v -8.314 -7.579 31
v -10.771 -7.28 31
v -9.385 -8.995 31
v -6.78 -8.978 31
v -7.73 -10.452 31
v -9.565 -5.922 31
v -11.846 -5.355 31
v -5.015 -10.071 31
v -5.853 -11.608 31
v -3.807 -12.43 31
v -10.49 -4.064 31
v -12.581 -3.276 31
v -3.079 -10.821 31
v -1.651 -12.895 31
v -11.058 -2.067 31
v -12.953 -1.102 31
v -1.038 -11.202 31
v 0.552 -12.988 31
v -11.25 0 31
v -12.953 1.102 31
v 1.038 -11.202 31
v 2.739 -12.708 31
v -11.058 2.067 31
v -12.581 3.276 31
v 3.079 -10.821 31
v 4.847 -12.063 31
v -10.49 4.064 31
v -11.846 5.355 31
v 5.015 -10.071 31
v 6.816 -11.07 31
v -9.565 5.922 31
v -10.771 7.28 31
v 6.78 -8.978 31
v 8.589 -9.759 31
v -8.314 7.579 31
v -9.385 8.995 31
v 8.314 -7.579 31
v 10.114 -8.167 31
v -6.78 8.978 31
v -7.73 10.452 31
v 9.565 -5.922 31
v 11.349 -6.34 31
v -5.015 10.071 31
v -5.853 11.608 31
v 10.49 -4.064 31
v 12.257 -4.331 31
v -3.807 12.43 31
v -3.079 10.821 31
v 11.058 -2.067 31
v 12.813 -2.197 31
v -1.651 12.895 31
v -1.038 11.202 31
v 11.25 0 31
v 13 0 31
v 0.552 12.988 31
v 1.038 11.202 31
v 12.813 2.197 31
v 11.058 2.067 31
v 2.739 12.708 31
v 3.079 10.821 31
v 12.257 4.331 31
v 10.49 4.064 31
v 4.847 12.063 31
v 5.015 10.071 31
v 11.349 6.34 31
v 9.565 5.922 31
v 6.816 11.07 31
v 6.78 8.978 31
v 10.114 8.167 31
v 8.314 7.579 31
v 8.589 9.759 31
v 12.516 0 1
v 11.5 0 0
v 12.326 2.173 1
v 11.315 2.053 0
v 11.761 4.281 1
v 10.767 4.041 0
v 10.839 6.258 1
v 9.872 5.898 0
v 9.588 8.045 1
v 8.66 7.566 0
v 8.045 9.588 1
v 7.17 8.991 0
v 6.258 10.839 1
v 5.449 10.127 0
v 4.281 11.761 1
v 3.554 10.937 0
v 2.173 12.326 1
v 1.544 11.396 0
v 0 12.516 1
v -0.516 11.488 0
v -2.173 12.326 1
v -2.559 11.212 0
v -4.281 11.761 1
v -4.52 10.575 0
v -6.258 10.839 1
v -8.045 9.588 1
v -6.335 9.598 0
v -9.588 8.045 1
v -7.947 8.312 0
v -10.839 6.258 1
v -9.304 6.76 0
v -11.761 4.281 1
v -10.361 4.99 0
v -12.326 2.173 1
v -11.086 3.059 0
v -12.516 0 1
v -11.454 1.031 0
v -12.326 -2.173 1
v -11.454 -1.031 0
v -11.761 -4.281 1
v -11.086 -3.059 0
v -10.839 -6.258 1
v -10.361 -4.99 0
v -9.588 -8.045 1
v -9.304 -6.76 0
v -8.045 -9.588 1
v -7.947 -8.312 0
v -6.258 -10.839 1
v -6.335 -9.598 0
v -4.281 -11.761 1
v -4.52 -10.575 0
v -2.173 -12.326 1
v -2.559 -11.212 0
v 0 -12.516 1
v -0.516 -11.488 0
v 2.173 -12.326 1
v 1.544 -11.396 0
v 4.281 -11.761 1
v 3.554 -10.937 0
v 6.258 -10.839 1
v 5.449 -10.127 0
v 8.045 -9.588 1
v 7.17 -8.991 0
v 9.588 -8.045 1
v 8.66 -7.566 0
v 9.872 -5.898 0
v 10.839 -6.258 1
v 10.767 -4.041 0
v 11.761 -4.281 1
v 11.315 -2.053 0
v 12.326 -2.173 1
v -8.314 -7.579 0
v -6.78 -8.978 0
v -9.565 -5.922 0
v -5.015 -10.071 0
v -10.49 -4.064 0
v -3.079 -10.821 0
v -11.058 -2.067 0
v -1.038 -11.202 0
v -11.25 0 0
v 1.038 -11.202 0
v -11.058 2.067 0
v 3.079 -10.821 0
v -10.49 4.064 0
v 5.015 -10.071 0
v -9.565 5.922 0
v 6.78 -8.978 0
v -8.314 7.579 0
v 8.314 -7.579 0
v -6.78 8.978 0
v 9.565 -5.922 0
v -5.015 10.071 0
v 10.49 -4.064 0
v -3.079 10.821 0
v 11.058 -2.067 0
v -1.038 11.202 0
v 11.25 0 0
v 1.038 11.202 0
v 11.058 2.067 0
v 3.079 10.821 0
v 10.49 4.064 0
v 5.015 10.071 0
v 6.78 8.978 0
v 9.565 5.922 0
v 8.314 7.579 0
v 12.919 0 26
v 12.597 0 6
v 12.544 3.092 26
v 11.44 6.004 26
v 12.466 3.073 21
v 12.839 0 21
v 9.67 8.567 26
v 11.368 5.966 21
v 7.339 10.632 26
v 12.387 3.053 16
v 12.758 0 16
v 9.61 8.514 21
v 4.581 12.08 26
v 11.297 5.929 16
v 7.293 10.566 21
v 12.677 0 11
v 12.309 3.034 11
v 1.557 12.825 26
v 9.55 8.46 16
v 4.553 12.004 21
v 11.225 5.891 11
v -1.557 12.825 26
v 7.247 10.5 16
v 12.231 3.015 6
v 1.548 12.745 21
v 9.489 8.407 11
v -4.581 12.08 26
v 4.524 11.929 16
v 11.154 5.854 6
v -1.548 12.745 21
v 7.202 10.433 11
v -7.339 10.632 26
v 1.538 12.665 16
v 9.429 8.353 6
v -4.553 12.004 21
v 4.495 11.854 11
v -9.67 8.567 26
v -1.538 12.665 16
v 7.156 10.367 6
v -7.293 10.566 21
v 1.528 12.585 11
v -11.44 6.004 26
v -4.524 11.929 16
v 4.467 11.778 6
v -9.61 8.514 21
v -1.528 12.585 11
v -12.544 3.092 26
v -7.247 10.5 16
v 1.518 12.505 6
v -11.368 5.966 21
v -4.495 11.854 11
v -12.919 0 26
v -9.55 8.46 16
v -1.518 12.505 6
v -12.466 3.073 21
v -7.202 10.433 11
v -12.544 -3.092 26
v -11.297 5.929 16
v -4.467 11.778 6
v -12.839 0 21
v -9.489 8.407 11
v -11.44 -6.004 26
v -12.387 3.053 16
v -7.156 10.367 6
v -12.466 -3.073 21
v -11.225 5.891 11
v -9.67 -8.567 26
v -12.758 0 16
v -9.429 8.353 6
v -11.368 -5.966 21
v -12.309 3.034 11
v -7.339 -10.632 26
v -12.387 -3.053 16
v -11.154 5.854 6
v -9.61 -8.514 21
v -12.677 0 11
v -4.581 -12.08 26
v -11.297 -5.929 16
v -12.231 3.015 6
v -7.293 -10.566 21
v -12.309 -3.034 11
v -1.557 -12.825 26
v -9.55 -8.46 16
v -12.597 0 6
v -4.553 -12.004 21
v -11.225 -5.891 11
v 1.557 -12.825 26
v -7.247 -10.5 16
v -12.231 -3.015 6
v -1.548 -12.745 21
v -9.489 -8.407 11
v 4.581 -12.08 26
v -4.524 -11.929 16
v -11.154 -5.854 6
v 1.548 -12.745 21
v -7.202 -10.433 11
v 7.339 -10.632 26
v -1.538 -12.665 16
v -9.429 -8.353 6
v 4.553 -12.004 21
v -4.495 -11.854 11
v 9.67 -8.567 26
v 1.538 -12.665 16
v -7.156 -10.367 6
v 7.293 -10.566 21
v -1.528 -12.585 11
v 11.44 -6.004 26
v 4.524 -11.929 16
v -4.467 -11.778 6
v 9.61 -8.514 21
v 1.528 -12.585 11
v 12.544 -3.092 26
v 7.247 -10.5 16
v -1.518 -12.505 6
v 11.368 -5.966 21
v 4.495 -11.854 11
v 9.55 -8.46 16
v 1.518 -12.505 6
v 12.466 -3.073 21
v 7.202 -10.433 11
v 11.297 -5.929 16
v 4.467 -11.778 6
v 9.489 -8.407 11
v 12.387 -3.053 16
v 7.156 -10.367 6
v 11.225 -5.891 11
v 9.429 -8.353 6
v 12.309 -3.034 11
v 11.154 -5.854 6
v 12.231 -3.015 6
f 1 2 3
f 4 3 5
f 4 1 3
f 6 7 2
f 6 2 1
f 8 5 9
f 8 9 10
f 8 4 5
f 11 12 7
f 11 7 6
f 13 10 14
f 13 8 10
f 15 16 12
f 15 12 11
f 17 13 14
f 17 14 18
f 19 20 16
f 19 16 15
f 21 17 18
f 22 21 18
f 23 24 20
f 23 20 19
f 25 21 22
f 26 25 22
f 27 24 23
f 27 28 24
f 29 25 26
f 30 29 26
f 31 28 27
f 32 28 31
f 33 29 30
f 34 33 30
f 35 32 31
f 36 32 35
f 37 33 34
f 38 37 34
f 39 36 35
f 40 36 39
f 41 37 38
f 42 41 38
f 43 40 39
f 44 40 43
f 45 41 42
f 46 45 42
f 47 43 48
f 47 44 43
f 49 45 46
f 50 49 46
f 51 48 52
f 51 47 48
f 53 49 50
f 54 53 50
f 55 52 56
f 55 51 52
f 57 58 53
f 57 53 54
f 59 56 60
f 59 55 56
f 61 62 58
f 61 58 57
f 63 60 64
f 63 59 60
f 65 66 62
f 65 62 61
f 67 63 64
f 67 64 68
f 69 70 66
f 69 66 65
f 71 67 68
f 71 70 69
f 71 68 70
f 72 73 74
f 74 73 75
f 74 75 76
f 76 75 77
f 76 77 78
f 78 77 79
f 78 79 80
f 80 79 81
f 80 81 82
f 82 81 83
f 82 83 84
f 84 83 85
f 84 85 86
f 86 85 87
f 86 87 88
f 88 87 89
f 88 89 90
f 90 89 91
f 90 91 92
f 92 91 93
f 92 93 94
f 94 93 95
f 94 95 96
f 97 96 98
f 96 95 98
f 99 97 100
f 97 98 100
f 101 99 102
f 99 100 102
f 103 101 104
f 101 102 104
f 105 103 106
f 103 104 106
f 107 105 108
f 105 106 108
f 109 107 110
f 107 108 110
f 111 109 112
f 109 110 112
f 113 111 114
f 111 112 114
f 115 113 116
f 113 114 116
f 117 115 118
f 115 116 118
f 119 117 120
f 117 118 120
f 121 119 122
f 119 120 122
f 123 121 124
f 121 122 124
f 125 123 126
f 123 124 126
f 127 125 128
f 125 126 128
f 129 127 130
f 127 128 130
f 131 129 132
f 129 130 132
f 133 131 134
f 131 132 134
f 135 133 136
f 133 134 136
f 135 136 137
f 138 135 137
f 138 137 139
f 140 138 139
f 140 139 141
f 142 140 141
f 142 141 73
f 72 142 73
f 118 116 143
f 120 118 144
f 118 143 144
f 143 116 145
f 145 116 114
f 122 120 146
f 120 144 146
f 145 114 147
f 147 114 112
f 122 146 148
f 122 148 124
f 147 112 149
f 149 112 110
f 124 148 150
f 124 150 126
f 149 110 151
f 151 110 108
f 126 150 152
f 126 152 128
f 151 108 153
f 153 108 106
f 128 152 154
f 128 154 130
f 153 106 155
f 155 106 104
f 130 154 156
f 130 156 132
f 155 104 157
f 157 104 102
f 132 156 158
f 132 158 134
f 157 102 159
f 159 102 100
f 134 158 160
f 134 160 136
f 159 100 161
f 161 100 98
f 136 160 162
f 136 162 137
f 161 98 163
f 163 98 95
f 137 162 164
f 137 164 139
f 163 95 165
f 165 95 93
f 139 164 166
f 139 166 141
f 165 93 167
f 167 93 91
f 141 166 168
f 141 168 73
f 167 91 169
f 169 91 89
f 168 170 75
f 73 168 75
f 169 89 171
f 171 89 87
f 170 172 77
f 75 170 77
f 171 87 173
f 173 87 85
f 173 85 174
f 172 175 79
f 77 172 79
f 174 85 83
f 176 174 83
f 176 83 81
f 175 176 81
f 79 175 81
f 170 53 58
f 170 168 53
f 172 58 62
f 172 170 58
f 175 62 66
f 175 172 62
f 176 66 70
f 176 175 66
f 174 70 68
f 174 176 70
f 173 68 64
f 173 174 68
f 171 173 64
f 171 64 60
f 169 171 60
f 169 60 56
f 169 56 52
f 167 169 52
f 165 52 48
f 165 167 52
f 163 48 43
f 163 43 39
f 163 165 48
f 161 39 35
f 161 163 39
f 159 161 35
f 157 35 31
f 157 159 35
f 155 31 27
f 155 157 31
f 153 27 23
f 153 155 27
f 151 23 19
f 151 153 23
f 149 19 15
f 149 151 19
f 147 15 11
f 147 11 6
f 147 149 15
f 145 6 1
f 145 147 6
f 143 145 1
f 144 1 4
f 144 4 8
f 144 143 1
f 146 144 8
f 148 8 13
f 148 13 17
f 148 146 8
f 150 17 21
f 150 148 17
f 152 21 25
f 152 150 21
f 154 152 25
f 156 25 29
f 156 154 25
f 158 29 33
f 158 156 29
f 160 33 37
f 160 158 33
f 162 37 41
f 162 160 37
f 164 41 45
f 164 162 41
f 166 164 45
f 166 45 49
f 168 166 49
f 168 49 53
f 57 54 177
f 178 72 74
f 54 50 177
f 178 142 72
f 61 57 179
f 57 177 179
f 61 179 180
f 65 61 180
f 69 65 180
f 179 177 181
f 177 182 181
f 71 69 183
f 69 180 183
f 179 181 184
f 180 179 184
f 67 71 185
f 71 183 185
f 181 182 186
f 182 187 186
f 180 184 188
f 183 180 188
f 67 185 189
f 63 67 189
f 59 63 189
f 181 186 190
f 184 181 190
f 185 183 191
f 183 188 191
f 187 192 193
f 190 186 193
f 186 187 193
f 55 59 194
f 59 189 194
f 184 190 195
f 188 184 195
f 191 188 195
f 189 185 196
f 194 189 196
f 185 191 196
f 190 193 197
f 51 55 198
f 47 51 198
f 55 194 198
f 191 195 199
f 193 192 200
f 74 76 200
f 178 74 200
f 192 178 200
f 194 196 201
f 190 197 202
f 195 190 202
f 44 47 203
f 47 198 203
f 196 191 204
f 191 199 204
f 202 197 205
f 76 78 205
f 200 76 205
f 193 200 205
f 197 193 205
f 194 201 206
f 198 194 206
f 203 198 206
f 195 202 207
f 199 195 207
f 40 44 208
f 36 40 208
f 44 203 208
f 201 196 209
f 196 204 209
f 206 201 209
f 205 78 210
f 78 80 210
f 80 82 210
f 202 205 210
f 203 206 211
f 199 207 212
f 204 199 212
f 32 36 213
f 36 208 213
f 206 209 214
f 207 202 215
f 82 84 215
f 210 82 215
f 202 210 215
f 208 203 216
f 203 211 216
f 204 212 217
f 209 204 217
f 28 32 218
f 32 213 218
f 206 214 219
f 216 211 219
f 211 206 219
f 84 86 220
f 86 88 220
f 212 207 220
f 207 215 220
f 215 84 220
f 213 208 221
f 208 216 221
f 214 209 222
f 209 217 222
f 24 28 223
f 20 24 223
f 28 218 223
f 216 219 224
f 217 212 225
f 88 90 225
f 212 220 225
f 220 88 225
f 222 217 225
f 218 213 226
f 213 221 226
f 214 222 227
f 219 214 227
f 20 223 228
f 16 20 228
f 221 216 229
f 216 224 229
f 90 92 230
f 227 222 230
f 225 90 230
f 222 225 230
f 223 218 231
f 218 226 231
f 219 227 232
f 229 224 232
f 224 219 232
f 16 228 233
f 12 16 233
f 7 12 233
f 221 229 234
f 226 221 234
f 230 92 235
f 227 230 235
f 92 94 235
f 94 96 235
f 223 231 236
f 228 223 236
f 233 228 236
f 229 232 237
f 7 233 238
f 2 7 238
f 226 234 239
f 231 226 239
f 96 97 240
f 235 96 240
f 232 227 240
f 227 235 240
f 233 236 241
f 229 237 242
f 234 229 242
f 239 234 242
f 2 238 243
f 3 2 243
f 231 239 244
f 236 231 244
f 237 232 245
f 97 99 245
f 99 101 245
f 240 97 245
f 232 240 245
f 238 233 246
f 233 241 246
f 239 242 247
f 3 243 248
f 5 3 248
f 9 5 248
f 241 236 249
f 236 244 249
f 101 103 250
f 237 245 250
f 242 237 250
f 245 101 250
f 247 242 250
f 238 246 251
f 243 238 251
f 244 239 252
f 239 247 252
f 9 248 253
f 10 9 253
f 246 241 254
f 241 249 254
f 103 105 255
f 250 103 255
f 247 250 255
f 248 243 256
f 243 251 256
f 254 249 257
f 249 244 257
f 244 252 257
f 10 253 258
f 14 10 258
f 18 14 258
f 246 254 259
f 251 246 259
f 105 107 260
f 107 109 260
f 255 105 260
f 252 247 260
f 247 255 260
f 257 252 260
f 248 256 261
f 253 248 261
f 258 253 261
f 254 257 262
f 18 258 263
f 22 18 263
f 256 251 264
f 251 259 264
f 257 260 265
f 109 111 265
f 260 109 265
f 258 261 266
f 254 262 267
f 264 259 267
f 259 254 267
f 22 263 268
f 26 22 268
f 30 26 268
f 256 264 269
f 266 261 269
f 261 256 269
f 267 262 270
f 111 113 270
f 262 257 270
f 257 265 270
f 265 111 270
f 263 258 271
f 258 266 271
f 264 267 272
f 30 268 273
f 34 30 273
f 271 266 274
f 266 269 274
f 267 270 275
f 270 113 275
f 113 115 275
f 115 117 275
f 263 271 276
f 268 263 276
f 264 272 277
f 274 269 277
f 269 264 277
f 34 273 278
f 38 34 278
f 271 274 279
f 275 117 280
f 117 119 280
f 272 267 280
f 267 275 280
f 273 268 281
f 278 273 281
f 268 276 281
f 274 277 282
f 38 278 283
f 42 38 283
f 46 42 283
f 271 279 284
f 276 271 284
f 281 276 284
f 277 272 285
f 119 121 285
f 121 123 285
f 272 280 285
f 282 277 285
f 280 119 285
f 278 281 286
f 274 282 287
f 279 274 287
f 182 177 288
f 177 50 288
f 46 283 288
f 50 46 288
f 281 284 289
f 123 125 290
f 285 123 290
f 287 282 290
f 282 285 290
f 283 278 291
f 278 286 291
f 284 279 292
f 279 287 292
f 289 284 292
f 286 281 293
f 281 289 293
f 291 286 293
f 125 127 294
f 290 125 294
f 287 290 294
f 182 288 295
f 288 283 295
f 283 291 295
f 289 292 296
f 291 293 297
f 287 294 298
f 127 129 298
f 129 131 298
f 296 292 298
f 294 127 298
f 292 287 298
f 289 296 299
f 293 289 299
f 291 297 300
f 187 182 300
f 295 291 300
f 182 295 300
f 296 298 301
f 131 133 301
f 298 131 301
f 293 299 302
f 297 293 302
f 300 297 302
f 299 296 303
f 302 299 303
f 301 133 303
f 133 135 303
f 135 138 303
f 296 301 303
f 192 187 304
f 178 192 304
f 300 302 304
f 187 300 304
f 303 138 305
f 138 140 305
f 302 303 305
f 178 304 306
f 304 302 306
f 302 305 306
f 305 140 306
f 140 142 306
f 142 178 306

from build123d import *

# Parameters (mm, degrees)
SKETCH001_R  = 13
SKETCH_R     = 12.5
SKETCH003_R  = 11.25
SKETCH002_R  = 11.25
CHAMFER_SIZE = 1


with BuildPart() as part:
    # Sketch001 (on DatumPlane) → AdditiveLoft section 0
    with BuildSketch(Plane.XY.offset(31)):
        Circle(SKETCH001_R)
    # Sketch → AdditiveLoft section 1
    with BuildSketch(Plane.XY):
        Circle(SKETCH_R)
    loft()

    # Sketch003 (on DatumPlane) → SubtractiveLoft section 0
    with BuildSketch(Plane.XY.offset(31)):
        Circle(SKETCH003_R)
    # Sketch002 → SubtractiveLoft section 1
    with BuildSketch(Plane.XY):
        Circle(SKETCH002_R)
    loft(mode=Mode.SUBTRACT)

    # Chamfer
    chamfer_edges = [part.edges().sort_by_distance(p)[0] for p in [
        (-12.5, 0, 0),
    ]]
    chamfer(chamfer_edges, length=CHAMFER_SIZE)


solid = part.part
